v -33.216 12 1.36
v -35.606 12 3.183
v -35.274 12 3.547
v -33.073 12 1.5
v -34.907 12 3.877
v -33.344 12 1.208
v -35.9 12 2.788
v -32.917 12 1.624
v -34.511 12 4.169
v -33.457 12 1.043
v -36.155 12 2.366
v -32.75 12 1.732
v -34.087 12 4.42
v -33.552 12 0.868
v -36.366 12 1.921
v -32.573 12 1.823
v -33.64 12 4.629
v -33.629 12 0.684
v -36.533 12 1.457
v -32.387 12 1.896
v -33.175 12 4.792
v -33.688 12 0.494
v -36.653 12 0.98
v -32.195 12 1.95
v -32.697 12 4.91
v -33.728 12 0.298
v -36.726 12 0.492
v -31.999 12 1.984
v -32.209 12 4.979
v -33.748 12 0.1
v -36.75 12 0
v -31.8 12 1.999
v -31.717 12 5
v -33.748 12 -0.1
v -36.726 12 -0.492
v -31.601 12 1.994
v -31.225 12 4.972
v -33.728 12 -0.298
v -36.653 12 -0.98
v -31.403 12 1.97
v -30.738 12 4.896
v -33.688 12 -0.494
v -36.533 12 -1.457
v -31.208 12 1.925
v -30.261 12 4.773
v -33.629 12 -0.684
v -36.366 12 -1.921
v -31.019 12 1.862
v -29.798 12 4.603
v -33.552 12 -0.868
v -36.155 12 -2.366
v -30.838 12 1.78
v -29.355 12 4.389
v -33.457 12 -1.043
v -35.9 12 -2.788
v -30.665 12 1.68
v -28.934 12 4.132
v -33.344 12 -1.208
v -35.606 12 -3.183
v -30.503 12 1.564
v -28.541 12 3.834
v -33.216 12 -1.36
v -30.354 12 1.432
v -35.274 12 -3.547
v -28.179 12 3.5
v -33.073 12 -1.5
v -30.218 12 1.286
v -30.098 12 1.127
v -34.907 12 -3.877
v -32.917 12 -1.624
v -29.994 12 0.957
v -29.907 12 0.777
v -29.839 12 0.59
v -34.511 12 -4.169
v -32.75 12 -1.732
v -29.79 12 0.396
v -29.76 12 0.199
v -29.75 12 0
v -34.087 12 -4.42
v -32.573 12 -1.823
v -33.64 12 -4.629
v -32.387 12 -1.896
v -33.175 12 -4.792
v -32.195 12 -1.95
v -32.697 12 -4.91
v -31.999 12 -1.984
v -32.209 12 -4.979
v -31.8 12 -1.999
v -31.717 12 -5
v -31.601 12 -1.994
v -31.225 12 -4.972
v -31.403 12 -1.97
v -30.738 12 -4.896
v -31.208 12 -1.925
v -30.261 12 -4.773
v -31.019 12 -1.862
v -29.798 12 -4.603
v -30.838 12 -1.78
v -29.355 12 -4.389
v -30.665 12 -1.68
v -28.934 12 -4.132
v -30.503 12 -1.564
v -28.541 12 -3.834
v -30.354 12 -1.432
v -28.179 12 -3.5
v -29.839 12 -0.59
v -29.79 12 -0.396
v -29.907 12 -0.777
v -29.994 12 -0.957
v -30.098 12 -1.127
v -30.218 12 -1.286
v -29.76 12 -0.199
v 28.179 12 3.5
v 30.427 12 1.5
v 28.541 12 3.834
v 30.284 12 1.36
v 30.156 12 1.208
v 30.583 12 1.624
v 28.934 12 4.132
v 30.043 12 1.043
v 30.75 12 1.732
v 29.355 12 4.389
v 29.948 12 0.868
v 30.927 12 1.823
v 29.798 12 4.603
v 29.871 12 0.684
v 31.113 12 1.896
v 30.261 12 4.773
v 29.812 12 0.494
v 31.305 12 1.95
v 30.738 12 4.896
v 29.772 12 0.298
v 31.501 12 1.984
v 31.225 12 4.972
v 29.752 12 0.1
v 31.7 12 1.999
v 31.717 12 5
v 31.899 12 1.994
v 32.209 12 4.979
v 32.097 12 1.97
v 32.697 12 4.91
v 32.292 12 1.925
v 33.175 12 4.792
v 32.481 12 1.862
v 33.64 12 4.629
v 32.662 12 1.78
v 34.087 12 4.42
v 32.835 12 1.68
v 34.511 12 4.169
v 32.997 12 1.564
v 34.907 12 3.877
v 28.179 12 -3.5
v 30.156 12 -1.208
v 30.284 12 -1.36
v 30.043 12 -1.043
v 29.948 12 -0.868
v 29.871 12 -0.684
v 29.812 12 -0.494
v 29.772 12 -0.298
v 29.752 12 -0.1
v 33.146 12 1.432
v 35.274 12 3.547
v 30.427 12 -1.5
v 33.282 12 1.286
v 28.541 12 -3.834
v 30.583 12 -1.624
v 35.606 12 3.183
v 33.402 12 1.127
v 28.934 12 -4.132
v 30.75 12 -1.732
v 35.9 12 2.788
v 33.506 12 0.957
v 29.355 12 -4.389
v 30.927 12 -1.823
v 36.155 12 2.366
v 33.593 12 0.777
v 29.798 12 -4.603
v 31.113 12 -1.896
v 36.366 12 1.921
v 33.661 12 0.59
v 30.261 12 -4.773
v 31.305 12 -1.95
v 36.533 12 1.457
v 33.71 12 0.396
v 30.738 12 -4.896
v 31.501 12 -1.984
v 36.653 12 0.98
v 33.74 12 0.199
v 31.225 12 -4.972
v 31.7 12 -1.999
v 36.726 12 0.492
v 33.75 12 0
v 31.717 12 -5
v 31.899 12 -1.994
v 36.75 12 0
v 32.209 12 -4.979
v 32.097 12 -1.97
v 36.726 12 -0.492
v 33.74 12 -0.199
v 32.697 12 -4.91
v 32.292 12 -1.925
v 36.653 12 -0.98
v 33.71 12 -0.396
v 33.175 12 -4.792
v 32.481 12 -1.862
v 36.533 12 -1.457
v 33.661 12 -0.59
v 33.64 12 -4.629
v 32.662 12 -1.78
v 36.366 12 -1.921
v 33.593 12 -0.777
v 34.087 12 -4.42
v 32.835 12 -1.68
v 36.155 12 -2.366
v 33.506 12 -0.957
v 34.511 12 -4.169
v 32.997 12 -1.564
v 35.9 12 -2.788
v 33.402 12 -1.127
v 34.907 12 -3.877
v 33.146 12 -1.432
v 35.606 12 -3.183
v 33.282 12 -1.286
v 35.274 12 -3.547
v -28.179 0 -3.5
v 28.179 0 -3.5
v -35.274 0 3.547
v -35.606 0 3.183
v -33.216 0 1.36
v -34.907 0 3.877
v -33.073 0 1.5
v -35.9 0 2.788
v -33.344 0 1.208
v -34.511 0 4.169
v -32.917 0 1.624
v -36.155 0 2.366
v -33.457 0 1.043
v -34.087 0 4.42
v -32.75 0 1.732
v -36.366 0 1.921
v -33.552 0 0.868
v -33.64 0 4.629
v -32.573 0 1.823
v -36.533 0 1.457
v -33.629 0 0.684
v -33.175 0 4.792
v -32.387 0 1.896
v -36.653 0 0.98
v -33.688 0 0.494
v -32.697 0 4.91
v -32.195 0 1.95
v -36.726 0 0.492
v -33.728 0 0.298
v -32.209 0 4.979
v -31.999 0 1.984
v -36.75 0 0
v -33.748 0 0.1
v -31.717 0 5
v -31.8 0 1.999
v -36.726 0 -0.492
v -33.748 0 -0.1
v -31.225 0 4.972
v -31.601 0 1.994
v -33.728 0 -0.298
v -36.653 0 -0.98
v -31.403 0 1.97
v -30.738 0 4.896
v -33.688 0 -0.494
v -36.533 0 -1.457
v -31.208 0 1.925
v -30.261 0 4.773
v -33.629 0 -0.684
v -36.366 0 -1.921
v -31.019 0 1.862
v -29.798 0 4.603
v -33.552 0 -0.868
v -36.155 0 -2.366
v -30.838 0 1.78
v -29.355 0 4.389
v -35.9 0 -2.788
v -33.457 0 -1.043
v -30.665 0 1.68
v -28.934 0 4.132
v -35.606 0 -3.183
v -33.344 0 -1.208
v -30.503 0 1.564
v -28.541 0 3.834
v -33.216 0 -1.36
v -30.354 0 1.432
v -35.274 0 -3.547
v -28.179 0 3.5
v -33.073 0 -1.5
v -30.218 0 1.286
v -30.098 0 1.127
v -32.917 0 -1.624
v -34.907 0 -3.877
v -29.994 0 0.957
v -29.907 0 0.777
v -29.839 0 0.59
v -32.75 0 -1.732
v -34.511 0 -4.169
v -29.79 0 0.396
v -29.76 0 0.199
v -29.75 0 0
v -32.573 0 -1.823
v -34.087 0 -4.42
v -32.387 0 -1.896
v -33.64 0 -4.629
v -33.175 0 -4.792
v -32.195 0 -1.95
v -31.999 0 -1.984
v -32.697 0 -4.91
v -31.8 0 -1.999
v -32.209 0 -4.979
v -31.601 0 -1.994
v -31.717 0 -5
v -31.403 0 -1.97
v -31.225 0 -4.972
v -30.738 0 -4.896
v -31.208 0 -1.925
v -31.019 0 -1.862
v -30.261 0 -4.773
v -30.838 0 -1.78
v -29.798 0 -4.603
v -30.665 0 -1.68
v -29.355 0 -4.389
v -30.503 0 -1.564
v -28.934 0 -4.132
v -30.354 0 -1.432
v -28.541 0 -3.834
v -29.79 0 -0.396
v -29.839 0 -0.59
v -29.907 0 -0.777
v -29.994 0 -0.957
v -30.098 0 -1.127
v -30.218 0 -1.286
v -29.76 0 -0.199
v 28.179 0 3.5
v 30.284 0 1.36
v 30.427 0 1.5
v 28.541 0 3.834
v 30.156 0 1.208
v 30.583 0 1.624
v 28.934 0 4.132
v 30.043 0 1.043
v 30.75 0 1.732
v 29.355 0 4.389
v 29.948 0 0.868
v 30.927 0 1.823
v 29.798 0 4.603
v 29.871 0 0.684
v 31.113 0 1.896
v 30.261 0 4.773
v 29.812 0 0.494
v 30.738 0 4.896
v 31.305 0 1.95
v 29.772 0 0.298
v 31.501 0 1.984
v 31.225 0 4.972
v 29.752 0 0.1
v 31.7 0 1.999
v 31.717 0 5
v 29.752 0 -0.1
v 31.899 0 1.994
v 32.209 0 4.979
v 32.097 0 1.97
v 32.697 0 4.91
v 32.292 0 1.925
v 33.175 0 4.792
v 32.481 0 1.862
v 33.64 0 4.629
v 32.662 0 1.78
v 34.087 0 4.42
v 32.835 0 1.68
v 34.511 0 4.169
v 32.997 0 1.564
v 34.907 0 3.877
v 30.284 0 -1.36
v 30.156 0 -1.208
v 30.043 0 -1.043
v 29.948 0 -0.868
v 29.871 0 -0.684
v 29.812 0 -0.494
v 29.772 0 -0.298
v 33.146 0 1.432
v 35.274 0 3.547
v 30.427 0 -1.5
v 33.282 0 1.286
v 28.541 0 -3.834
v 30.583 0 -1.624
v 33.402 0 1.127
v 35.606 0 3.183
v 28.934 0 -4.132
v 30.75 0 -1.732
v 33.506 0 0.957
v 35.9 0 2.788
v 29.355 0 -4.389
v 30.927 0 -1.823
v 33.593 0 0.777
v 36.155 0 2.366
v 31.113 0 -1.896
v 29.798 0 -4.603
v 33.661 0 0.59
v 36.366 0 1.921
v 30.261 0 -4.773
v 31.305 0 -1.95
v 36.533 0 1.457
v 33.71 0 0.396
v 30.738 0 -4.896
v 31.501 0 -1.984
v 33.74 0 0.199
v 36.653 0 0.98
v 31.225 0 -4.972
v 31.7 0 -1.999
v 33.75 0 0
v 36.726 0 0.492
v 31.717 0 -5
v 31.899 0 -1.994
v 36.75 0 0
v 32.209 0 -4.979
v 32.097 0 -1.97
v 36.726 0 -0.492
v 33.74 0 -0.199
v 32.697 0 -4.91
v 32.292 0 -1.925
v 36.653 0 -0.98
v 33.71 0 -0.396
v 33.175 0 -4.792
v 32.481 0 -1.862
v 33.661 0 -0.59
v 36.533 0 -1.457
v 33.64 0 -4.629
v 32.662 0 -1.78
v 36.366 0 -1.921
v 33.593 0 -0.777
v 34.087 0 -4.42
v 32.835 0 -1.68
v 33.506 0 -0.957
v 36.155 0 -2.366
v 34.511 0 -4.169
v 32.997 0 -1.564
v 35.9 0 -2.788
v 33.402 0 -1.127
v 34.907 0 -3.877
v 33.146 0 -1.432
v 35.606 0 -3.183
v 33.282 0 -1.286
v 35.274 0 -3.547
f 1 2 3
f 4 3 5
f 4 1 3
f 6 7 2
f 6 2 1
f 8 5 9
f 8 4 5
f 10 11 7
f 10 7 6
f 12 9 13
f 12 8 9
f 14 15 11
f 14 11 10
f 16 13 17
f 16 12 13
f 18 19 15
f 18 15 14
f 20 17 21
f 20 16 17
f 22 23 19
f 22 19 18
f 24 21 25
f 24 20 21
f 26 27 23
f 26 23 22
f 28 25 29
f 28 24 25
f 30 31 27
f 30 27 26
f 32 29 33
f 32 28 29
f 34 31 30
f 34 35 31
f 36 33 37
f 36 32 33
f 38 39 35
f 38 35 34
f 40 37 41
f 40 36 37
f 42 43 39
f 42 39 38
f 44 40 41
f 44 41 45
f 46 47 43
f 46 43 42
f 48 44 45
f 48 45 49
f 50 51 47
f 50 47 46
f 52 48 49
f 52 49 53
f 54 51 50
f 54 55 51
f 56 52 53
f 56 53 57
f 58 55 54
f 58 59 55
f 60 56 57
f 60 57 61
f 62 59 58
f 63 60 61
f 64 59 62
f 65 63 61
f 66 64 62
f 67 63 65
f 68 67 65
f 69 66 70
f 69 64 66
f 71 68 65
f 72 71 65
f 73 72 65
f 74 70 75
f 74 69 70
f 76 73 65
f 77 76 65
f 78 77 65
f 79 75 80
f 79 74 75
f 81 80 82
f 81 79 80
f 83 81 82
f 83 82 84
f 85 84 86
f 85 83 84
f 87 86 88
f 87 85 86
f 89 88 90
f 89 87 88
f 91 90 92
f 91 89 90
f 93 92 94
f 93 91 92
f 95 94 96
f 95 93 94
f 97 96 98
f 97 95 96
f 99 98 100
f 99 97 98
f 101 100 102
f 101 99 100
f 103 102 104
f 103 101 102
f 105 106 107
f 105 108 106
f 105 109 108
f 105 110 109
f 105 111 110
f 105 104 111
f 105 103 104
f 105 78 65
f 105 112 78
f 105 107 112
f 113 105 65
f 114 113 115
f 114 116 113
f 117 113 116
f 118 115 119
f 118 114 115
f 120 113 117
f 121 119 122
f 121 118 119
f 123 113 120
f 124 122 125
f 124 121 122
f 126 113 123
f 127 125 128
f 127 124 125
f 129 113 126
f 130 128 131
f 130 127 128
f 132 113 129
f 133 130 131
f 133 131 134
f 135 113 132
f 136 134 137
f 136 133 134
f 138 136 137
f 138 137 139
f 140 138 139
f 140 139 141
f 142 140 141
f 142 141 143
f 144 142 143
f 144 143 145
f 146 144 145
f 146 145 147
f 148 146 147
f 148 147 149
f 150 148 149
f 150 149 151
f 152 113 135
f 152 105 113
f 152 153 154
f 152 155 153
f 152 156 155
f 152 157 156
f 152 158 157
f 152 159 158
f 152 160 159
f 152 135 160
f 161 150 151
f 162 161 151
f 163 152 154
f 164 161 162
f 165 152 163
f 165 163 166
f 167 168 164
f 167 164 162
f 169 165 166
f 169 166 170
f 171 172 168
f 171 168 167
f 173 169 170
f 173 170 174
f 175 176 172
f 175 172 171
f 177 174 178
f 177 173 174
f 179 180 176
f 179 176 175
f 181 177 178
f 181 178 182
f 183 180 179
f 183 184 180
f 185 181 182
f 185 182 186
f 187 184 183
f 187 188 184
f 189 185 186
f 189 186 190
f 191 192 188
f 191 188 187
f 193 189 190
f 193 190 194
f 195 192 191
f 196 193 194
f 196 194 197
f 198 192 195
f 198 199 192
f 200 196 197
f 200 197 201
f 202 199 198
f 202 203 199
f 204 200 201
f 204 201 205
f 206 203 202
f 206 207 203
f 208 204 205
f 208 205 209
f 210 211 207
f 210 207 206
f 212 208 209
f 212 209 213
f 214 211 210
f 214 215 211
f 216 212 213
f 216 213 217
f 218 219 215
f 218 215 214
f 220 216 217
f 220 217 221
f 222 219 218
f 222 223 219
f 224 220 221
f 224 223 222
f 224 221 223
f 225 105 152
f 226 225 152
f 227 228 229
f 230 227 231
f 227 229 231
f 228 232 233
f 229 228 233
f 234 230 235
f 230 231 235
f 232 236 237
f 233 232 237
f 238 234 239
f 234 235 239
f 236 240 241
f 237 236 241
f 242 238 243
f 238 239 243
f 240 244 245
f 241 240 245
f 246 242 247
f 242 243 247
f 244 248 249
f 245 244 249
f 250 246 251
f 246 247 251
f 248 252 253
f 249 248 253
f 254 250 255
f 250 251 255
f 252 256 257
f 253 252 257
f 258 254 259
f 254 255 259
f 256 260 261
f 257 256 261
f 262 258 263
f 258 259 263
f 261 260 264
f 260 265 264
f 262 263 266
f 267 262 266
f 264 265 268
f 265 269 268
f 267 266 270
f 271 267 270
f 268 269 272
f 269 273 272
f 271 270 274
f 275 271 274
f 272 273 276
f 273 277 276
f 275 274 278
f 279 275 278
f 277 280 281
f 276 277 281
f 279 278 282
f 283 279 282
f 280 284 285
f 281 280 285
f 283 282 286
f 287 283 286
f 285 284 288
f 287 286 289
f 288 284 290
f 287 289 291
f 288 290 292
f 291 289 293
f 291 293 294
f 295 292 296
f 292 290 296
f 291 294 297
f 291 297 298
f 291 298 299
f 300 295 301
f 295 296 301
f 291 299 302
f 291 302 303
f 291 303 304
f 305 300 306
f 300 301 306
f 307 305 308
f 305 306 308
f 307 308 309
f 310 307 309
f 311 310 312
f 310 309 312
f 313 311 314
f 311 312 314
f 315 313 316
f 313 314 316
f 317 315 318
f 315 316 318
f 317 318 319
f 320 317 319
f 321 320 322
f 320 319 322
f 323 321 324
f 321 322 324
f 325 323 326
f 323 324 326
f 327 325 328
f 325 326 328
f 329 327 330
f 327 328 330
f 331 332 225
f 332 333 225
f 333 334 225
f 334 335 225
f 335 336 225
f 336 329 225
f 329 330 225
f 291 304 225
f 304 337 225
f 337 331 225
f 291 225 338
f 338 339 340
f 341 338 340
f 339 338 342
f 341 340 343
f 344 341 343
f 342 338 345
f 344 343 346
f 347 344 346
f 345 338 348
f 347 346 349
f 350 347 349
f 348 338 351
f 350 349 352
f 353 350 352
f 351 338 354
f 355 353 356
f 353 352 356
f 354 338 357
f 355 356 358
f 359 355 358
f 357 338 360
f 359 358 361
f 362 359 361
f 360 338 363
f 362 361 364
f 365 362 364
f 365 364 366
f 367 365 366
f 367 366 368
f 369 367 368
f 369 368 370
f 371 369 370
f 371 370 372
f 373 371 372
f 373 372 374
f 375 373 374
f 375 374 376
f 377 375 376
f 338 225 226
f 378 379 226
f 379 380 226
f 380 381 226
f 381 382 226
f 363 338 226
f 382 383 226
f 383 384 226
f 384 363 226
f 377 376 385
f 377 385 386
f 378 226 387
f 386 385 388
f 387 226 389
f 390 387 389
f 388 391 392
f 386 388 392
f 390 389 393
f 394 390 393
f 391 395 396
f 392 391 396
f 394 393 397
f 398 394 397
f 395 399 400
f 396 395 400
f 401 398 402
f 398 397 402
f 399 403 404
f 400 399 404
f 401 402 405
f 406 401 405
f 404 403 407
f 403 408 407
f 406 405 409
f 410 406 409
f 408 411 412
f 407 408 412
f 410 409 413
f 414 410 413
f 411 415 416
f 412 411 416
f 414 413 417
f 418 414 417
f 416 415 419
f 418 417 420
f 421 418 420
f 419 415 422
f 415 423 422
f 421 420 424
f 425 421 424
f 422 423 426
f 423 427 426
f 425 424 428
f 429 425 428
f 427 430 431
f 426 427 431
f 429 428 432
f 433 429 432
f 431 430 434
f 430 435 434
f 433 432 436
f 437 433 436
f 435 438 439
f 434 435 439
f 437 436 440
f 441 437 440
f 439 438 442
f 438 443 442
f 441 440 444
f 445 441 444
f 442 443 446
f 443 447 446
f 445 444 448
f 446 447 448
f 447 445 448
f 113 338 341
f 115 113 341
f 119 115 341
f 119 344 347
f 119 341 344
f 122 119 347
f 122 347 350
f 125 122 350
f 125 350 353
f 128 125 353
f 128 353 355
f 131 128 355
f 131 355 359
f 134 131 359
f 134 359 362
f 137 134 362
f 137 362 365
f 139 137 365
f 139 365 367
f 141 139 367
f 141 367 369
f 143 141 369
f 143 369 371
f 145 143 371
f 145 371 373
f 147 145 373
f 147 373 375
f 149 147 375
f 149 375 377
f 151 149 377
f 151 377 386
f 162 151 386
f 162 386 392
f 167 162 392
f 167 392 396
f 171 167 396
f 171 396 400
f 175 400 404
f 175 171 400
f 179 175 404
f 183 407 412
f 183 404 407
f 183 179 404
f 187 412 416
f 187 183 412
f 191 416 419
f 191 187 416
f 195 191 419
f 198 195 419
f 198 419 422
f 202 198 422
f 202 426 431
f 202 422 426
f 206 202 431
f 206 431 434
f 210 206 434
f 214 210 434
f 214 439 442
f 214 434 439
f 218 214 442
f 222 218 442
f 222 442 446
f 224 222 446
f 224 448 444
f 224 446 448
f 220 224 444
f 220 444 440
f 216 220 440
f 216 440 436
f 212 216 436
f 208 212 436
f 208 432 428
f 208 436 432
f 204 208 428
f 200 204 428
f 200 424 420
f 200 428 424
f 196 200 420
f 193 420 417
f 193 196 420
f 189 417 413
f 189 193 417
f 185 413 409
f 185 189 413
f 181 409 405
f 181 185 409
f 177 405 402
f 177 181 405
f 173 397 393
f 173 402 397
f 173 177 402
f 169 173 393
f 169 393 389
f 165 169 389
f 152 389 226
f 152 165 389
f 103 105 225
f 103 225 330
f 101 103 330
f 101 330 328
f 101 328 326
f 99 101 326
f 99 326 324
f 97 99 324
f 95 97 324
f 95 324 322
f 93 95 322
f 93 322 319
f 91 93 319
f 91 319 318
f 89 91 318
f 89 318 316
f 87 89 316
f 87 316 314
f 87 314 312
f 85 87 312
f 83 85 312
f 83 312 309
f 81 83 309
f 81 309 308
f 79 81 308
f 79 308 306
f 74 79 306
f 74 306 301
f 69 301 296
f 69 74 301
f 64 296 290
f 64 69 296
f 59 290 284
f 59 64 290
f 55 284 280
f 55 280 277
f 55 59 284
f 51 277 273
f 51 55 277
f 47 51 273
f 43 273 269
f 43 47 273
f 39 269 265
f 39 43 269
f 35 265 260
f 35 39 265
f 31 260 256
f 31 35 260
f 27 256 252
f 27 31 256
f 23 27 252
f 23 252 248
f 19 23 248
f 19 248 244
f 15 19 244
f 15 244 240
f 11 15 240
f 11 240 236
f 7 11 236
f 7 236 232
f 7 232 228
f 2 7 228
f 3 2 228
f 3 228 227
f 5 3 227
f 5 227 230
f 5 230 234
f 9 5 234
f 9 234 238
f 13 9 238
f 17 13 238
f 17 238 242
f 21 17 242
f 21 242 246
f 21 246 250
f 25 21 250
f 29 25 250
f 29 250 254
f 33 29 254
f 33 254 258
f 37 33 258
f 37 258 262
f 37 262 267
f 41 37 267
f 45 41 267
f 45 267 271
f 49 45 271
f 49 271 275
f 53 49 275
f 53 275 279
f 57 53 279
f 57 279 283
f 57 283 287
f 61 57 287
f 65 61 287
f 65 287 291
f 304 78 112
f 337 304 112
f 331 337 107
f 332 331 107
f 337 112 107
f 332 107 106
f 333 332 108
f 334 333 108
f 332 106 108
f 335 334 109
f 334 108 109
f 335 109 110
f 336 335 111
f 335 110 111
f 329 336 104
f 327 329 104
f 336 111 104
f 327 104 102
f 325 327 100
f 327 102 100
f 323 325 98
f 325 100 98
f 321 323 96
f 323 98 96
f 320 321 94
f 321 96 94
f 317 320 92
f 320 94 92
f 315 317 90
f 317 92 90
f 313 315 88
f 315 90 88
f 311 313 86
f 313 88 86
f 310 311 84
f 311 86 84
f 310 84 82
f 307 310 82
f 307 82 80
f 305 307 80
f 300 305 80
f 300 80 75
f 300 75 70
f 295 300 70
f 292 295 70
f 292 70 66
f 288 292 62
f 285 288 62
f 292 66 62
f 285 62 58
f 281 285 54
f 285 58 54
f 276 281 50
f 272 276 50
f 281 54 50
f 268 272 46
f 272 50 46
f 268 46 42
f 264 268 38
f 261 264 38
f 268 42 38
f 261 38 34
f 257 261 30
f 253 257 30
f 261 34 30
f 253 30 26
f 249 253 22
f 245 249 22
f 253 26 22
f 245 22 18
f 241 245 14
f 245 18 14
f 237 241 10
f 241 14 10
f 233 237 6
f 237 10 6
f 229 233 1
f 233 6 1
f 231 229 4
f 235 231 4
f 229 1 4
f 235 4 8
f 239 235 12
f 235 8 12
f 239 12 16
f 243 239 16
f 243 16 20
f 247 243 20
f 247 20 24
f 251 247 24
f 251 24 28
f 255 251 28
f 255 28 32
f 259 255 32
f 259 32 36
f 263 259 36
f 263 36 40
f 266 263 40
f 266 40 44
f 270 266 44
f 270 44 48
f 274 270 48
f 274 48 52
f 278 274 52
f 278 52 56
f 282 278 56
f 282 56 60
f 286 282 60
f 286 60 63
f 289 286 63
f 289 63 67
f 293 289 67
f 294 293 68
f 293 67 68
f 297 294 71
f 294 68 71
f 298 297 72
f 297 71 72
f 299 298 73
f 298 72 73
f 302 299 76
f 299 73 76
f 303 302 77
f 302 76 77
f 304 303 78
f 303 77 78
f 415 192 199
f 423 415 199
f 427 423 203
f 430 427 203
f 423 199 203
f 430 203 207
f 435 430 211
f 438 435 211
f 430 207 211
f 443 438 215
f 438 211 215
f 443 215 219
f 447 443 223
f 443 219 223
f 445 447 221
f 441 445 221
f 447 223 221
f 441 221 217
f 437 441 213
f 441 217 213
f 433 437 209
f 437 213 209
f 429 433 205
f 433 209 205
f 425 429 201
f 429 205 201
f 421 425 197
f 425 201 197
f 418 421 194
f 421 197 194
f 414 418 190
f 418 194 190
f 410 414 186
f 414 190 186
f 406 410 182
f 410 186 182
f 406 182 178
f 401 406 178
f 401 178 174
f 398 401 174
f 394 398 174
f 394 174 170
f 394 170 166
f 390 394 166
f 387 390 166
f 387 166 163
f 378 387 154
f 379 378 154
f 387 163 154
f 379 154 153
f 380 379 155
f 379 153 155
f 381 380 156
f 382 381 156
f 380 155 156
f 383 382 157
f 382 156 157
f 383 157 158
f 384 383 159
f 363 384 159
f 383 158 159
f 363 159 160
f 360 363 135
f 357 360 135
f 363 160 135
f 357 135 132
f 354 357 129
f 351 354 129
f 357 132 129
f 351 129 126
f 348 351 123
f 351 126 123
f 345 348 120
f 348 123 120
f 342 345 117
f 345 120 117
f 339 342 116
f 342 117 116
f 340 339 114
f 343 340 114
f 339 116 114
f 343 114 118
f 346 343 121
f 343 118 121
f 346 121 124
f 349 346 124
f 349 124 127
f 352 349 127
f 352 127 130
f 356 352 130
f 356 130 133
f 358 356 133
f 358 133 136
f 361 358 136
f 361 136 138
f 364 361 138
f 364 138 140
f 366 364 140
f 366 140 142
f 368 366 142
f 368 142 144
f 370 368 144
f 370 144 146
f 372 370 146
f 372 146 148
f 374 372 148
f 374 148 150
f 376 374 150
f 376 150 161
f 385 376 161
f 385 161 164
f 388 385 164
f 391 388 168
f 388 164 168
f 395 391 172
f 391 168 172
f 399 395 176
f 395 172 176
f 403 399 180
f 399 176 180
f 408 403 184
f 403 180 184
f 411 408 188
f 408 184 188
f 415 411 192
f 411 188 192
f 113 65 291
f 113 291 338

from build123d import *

# Parameters (mm, degrees)
CROQUIS1_W              = 56
CROQUIS1_H              = 5
SALIENTE_EXTRUIR1_DEPTH = 12
CROQUIS2_R              = 4
SALIENTE_EXTRUIR2_DEPTH = 12
CROQUIS3_W              = 61.198456306
CROQUIS3_H              = 5.5
SALIENTE_EXTRUIR3_DEPTH = 12
CROQUIS4_R              = 2
CORTAR_EXTRUIR1_DEPTH   = 12
CROQUIS5_R              = 5
SALIENTE_EXTRUIR4_DEPTH = 12
CROQUIS6_W              = 56.358571572
CROQUIS6_H              = 7
SALIENTE_EXTRUIR5_DEPTH = 12
CROQUIS7_R              = 2
CORTAR_EXTRUIR2_DEPTH   = 12


with BuildPart() as part:
    # Croquis1 → Saliente-Extruir1 (new body)
    with BuildSketch(Plane(origin=(0, 0, 0), x_dir=(1, 0, 0), z_dir=(0, 1, 0))):
        Rectangle(CROQUIS1_W, CROQUIS1_H)
    extrude(amount=SALIENTE_EXTRUIR1_DEPTH)

    # Croquis2 → Saliente-Extruir2 (add)
    with BuildSketch(Plane(origin=(0, 12, 0), x_dir=(1, 0, 0), z_dir=(0, 1, 0))):
        with Locations((31.75, 0)):
            Circle(CROQUIS2_R)
        with Locations((-31.75, 0)):
            Circle(CROQUIS2_R)
    extrude(amount=-SALIENTE_EXTRUIR2_DEPTH)

    # Croquis3 → Saliente-Extruir3 (add)
    with BuildSketch(Plane(origin=(0, 12, 0), x_dir=(1, 0, 0), z_dir=(0, 1, 0))):
        Rectangle(CROQUIS3_W, CROQUIS3_H)
    extrude(amount=-SALIENTE_EXTRUIR3_DEPTH)

    # Croquis4 → Cortar-Extruir1 (cut)
    with BuildSketch(Plane(origin=(0, 12, 0), x_dir=(1, 0, 0), z_dir=(0, 1, 0))):
        with Locations((-31.75, 0)):
            Circle(CROQUIS4_R)
        with Locations((31.75, 0)):
            Circle(CROQUIS4_R)
    extrude(amount=-CORTAR_EXTRUIR1_DEPTH, mode=Mode.SUBTRACT)

    # Croquis5 → Saliente-Extruir4 (add)
    with BuildSketch(Plane(origin=(0, 12, 0), x_dir=(1, 0, 0), z_dir=(0, 1, 0))):
        with Locations((-31.75, 0)):
            Circle(CROQUIS5_R)
        with Locations((31.75, 0)):
            Circle(CROQUIS5_R)
    extrude(amount=-SALIENTE_EXTRUIR4_DEPTH)

    # Croquis6 → Saliente-Extruir5 (add)
    with BuildSketch(Plane(origin=(0, 12, 0), x_dir=(1, 0, 0), z_dir=(0, 1, 0))):
        Rectangle(CROQUIS6_W, CROQUIS6_H)
    extrude(amount=-SALIENTE_EXTRUIR5_DEPTH)

    # Croquis7 → Cortar-Extruir2 (cut)
    with BuildSketch(Plane(origin=(0, 12, 0), x_dir=(1, 0, 0), z_dir=(0, 1, 0))):
        with Locations((31.75, 0)):
            Circle(CROQUIS7_R)
        with Locations((-31.75, 0)):
            Circle(CROQUIS7_R)
    extrude(amount=-CORTAR_EXTRUIR2_DEPTH, mode=Mode.SUBTRACT)


solid = part.part
